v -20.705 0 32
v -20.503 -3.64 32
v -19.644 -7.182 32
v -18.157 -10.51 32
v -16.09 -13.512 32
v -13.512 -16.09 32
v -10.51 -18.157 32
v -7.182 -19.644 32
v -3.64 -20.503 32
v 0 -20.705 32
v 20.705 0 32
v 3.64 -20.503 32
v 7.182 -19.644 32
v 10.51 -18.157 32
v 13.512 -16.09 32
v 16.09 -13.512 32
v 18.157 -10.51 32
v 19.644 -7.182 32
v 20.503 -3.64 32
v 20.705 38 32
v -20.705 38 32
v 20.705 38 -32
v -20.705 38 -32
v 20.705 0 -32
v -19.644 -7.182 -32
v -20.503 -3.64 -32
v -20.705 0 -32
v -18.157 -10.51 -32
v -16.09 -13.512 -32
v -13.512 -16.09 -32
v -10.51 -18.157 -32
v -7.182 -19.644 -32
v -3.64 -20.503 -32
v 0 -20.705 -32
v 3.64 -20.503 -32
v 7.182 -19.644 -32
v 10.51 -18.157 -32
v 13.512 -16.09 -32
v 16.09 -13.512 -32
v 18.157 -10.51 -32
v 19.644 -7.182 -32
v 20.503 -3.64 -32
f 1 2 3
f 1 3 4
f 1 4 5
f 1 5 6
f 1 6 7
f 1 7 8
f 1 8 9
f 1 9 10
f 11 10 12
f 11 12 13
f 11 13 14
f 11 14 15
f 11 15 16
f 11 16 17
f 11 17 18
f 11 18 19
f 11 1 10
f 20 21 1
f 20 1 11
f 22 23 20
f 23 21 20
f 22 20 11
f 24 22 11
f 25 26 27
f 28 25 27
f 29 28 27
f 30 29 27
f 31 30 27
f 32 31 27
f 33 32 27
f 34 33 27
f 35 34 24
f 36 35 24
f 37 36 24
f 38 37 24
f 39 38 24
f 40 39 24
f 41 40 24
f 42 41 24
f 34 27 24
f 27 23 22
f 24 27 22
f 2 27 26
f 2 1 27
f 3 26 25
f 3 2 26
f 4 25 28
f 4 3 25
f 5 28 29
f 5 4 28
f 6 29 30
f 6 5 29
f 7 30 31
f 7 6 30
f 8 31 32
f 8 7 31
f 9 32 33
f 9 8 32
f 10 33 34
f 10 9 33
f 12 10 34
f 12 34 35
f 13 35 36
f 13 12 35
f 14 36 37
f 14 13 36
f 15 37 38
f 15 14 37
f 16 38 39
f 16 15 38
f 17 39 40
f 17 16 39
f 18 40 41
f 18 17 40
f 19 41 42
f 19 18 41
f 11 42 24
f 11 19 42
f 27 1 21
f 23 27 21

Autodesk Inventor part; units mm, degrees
ref_plane "YZ Plane" through (0, 0, 0) normal (1, 0, 0) x (0, 1, 0)
ref_plane "XZ Plane" through (0, 0, 0) normal (0, 1, 0) x (-1, 0, 0)
ref_plane "XY Plane" through (0, 0, 0) normal (0, 0, 1) x (1, 0, 0)
sketch "Sketch1" plane through (0, 0, 0) normal (0, 0, 1) x (1, 0, 0)
  circle A0 centre (0, 0) radius 17.705
  circle A1 centre (0, 0) radius 15
  circle A2 centre (0, 15) radius 0.75
  circle A3 centre (-10.6066, 10.6066) radius 0.75
  circle A4 centre (0, 0) radius 15
  circle A5 centre (-15, 0) radius 0.75
  circle A6 centre (0, 0) radius 15
  circle A7 centre (-10.6066, -10.6066) radius 0.75
  circle A8 centre (0, 0) radius 15
  circle A9 centre (0, -15) radius 0.75
  circle A10 centre (0, 0) radius 15
  circle A11 centre (10.6066, -10.6066) radius 0.75
  circle A12 centre (0, 0) radius 15
  circle A13 centre (15, 0) radius 0.75
  circle A14 centre (0, 0) radius 15
  circle A15 centre (10.6066, 10.6066) radius 0.75
  circle A16 centre (0, 0) radius 15
  line L0 (-20.705, 38) -> (20.705, 38)
  arc A17 (0, -20.705) -> (20.705, 0) centre (0.7179, -0.7179) ccw
  arc A18 (-20.705, 0) -> (0, -20.705) centre (-0.7179, -0.7179) ccw
  line L1 (-20.705, 0) -> (-20.705, 38)
  line L2 (20.705, 38) -> (20.705, 0)
  dimension "d1" = 30
  dimension "d0" = 35.41
  dimension "d2" = 1.5
  dimension "d5" = 360
  dimension "d10" = 38
  dimension "d11" = 20
  dimension "d12" = 20
  dimension "d15" = 58.705
sketch "Sketch2" plane through (0, 0, 0) normal (0, 0, 1) x (1, 0, 0)
  point P0 (0, 0)
sketch "Sketch3" plane through (0, 0, 0) normal (0, 0, 1) x (1, 0, 0)
  point P0 (0, 0)
sketch "Sketch4" plane through (0, 0, 0) normal (0, 0, 1) x (1, 0, 0)
  point P0 (0, 0)
extrude "Extrusion1" add sketch "Sketch1" along normal mid plane 64 contours A0 | A1 A13 | A1 A13 | A13 A1 A11 A9 A7 A5 A3 A2 A15 | A15 A1 | A1 A15 | A11 A1 | A1 A11 | A2 A1 | A1 A2 | A9 A1 | A1 A9 | A3 A1 | A1 A3 | A7 A1 | A1 A7 | A5 A1 | A1 A5 | L0 L2 A17 A18 L1
properties part number "Horn"
